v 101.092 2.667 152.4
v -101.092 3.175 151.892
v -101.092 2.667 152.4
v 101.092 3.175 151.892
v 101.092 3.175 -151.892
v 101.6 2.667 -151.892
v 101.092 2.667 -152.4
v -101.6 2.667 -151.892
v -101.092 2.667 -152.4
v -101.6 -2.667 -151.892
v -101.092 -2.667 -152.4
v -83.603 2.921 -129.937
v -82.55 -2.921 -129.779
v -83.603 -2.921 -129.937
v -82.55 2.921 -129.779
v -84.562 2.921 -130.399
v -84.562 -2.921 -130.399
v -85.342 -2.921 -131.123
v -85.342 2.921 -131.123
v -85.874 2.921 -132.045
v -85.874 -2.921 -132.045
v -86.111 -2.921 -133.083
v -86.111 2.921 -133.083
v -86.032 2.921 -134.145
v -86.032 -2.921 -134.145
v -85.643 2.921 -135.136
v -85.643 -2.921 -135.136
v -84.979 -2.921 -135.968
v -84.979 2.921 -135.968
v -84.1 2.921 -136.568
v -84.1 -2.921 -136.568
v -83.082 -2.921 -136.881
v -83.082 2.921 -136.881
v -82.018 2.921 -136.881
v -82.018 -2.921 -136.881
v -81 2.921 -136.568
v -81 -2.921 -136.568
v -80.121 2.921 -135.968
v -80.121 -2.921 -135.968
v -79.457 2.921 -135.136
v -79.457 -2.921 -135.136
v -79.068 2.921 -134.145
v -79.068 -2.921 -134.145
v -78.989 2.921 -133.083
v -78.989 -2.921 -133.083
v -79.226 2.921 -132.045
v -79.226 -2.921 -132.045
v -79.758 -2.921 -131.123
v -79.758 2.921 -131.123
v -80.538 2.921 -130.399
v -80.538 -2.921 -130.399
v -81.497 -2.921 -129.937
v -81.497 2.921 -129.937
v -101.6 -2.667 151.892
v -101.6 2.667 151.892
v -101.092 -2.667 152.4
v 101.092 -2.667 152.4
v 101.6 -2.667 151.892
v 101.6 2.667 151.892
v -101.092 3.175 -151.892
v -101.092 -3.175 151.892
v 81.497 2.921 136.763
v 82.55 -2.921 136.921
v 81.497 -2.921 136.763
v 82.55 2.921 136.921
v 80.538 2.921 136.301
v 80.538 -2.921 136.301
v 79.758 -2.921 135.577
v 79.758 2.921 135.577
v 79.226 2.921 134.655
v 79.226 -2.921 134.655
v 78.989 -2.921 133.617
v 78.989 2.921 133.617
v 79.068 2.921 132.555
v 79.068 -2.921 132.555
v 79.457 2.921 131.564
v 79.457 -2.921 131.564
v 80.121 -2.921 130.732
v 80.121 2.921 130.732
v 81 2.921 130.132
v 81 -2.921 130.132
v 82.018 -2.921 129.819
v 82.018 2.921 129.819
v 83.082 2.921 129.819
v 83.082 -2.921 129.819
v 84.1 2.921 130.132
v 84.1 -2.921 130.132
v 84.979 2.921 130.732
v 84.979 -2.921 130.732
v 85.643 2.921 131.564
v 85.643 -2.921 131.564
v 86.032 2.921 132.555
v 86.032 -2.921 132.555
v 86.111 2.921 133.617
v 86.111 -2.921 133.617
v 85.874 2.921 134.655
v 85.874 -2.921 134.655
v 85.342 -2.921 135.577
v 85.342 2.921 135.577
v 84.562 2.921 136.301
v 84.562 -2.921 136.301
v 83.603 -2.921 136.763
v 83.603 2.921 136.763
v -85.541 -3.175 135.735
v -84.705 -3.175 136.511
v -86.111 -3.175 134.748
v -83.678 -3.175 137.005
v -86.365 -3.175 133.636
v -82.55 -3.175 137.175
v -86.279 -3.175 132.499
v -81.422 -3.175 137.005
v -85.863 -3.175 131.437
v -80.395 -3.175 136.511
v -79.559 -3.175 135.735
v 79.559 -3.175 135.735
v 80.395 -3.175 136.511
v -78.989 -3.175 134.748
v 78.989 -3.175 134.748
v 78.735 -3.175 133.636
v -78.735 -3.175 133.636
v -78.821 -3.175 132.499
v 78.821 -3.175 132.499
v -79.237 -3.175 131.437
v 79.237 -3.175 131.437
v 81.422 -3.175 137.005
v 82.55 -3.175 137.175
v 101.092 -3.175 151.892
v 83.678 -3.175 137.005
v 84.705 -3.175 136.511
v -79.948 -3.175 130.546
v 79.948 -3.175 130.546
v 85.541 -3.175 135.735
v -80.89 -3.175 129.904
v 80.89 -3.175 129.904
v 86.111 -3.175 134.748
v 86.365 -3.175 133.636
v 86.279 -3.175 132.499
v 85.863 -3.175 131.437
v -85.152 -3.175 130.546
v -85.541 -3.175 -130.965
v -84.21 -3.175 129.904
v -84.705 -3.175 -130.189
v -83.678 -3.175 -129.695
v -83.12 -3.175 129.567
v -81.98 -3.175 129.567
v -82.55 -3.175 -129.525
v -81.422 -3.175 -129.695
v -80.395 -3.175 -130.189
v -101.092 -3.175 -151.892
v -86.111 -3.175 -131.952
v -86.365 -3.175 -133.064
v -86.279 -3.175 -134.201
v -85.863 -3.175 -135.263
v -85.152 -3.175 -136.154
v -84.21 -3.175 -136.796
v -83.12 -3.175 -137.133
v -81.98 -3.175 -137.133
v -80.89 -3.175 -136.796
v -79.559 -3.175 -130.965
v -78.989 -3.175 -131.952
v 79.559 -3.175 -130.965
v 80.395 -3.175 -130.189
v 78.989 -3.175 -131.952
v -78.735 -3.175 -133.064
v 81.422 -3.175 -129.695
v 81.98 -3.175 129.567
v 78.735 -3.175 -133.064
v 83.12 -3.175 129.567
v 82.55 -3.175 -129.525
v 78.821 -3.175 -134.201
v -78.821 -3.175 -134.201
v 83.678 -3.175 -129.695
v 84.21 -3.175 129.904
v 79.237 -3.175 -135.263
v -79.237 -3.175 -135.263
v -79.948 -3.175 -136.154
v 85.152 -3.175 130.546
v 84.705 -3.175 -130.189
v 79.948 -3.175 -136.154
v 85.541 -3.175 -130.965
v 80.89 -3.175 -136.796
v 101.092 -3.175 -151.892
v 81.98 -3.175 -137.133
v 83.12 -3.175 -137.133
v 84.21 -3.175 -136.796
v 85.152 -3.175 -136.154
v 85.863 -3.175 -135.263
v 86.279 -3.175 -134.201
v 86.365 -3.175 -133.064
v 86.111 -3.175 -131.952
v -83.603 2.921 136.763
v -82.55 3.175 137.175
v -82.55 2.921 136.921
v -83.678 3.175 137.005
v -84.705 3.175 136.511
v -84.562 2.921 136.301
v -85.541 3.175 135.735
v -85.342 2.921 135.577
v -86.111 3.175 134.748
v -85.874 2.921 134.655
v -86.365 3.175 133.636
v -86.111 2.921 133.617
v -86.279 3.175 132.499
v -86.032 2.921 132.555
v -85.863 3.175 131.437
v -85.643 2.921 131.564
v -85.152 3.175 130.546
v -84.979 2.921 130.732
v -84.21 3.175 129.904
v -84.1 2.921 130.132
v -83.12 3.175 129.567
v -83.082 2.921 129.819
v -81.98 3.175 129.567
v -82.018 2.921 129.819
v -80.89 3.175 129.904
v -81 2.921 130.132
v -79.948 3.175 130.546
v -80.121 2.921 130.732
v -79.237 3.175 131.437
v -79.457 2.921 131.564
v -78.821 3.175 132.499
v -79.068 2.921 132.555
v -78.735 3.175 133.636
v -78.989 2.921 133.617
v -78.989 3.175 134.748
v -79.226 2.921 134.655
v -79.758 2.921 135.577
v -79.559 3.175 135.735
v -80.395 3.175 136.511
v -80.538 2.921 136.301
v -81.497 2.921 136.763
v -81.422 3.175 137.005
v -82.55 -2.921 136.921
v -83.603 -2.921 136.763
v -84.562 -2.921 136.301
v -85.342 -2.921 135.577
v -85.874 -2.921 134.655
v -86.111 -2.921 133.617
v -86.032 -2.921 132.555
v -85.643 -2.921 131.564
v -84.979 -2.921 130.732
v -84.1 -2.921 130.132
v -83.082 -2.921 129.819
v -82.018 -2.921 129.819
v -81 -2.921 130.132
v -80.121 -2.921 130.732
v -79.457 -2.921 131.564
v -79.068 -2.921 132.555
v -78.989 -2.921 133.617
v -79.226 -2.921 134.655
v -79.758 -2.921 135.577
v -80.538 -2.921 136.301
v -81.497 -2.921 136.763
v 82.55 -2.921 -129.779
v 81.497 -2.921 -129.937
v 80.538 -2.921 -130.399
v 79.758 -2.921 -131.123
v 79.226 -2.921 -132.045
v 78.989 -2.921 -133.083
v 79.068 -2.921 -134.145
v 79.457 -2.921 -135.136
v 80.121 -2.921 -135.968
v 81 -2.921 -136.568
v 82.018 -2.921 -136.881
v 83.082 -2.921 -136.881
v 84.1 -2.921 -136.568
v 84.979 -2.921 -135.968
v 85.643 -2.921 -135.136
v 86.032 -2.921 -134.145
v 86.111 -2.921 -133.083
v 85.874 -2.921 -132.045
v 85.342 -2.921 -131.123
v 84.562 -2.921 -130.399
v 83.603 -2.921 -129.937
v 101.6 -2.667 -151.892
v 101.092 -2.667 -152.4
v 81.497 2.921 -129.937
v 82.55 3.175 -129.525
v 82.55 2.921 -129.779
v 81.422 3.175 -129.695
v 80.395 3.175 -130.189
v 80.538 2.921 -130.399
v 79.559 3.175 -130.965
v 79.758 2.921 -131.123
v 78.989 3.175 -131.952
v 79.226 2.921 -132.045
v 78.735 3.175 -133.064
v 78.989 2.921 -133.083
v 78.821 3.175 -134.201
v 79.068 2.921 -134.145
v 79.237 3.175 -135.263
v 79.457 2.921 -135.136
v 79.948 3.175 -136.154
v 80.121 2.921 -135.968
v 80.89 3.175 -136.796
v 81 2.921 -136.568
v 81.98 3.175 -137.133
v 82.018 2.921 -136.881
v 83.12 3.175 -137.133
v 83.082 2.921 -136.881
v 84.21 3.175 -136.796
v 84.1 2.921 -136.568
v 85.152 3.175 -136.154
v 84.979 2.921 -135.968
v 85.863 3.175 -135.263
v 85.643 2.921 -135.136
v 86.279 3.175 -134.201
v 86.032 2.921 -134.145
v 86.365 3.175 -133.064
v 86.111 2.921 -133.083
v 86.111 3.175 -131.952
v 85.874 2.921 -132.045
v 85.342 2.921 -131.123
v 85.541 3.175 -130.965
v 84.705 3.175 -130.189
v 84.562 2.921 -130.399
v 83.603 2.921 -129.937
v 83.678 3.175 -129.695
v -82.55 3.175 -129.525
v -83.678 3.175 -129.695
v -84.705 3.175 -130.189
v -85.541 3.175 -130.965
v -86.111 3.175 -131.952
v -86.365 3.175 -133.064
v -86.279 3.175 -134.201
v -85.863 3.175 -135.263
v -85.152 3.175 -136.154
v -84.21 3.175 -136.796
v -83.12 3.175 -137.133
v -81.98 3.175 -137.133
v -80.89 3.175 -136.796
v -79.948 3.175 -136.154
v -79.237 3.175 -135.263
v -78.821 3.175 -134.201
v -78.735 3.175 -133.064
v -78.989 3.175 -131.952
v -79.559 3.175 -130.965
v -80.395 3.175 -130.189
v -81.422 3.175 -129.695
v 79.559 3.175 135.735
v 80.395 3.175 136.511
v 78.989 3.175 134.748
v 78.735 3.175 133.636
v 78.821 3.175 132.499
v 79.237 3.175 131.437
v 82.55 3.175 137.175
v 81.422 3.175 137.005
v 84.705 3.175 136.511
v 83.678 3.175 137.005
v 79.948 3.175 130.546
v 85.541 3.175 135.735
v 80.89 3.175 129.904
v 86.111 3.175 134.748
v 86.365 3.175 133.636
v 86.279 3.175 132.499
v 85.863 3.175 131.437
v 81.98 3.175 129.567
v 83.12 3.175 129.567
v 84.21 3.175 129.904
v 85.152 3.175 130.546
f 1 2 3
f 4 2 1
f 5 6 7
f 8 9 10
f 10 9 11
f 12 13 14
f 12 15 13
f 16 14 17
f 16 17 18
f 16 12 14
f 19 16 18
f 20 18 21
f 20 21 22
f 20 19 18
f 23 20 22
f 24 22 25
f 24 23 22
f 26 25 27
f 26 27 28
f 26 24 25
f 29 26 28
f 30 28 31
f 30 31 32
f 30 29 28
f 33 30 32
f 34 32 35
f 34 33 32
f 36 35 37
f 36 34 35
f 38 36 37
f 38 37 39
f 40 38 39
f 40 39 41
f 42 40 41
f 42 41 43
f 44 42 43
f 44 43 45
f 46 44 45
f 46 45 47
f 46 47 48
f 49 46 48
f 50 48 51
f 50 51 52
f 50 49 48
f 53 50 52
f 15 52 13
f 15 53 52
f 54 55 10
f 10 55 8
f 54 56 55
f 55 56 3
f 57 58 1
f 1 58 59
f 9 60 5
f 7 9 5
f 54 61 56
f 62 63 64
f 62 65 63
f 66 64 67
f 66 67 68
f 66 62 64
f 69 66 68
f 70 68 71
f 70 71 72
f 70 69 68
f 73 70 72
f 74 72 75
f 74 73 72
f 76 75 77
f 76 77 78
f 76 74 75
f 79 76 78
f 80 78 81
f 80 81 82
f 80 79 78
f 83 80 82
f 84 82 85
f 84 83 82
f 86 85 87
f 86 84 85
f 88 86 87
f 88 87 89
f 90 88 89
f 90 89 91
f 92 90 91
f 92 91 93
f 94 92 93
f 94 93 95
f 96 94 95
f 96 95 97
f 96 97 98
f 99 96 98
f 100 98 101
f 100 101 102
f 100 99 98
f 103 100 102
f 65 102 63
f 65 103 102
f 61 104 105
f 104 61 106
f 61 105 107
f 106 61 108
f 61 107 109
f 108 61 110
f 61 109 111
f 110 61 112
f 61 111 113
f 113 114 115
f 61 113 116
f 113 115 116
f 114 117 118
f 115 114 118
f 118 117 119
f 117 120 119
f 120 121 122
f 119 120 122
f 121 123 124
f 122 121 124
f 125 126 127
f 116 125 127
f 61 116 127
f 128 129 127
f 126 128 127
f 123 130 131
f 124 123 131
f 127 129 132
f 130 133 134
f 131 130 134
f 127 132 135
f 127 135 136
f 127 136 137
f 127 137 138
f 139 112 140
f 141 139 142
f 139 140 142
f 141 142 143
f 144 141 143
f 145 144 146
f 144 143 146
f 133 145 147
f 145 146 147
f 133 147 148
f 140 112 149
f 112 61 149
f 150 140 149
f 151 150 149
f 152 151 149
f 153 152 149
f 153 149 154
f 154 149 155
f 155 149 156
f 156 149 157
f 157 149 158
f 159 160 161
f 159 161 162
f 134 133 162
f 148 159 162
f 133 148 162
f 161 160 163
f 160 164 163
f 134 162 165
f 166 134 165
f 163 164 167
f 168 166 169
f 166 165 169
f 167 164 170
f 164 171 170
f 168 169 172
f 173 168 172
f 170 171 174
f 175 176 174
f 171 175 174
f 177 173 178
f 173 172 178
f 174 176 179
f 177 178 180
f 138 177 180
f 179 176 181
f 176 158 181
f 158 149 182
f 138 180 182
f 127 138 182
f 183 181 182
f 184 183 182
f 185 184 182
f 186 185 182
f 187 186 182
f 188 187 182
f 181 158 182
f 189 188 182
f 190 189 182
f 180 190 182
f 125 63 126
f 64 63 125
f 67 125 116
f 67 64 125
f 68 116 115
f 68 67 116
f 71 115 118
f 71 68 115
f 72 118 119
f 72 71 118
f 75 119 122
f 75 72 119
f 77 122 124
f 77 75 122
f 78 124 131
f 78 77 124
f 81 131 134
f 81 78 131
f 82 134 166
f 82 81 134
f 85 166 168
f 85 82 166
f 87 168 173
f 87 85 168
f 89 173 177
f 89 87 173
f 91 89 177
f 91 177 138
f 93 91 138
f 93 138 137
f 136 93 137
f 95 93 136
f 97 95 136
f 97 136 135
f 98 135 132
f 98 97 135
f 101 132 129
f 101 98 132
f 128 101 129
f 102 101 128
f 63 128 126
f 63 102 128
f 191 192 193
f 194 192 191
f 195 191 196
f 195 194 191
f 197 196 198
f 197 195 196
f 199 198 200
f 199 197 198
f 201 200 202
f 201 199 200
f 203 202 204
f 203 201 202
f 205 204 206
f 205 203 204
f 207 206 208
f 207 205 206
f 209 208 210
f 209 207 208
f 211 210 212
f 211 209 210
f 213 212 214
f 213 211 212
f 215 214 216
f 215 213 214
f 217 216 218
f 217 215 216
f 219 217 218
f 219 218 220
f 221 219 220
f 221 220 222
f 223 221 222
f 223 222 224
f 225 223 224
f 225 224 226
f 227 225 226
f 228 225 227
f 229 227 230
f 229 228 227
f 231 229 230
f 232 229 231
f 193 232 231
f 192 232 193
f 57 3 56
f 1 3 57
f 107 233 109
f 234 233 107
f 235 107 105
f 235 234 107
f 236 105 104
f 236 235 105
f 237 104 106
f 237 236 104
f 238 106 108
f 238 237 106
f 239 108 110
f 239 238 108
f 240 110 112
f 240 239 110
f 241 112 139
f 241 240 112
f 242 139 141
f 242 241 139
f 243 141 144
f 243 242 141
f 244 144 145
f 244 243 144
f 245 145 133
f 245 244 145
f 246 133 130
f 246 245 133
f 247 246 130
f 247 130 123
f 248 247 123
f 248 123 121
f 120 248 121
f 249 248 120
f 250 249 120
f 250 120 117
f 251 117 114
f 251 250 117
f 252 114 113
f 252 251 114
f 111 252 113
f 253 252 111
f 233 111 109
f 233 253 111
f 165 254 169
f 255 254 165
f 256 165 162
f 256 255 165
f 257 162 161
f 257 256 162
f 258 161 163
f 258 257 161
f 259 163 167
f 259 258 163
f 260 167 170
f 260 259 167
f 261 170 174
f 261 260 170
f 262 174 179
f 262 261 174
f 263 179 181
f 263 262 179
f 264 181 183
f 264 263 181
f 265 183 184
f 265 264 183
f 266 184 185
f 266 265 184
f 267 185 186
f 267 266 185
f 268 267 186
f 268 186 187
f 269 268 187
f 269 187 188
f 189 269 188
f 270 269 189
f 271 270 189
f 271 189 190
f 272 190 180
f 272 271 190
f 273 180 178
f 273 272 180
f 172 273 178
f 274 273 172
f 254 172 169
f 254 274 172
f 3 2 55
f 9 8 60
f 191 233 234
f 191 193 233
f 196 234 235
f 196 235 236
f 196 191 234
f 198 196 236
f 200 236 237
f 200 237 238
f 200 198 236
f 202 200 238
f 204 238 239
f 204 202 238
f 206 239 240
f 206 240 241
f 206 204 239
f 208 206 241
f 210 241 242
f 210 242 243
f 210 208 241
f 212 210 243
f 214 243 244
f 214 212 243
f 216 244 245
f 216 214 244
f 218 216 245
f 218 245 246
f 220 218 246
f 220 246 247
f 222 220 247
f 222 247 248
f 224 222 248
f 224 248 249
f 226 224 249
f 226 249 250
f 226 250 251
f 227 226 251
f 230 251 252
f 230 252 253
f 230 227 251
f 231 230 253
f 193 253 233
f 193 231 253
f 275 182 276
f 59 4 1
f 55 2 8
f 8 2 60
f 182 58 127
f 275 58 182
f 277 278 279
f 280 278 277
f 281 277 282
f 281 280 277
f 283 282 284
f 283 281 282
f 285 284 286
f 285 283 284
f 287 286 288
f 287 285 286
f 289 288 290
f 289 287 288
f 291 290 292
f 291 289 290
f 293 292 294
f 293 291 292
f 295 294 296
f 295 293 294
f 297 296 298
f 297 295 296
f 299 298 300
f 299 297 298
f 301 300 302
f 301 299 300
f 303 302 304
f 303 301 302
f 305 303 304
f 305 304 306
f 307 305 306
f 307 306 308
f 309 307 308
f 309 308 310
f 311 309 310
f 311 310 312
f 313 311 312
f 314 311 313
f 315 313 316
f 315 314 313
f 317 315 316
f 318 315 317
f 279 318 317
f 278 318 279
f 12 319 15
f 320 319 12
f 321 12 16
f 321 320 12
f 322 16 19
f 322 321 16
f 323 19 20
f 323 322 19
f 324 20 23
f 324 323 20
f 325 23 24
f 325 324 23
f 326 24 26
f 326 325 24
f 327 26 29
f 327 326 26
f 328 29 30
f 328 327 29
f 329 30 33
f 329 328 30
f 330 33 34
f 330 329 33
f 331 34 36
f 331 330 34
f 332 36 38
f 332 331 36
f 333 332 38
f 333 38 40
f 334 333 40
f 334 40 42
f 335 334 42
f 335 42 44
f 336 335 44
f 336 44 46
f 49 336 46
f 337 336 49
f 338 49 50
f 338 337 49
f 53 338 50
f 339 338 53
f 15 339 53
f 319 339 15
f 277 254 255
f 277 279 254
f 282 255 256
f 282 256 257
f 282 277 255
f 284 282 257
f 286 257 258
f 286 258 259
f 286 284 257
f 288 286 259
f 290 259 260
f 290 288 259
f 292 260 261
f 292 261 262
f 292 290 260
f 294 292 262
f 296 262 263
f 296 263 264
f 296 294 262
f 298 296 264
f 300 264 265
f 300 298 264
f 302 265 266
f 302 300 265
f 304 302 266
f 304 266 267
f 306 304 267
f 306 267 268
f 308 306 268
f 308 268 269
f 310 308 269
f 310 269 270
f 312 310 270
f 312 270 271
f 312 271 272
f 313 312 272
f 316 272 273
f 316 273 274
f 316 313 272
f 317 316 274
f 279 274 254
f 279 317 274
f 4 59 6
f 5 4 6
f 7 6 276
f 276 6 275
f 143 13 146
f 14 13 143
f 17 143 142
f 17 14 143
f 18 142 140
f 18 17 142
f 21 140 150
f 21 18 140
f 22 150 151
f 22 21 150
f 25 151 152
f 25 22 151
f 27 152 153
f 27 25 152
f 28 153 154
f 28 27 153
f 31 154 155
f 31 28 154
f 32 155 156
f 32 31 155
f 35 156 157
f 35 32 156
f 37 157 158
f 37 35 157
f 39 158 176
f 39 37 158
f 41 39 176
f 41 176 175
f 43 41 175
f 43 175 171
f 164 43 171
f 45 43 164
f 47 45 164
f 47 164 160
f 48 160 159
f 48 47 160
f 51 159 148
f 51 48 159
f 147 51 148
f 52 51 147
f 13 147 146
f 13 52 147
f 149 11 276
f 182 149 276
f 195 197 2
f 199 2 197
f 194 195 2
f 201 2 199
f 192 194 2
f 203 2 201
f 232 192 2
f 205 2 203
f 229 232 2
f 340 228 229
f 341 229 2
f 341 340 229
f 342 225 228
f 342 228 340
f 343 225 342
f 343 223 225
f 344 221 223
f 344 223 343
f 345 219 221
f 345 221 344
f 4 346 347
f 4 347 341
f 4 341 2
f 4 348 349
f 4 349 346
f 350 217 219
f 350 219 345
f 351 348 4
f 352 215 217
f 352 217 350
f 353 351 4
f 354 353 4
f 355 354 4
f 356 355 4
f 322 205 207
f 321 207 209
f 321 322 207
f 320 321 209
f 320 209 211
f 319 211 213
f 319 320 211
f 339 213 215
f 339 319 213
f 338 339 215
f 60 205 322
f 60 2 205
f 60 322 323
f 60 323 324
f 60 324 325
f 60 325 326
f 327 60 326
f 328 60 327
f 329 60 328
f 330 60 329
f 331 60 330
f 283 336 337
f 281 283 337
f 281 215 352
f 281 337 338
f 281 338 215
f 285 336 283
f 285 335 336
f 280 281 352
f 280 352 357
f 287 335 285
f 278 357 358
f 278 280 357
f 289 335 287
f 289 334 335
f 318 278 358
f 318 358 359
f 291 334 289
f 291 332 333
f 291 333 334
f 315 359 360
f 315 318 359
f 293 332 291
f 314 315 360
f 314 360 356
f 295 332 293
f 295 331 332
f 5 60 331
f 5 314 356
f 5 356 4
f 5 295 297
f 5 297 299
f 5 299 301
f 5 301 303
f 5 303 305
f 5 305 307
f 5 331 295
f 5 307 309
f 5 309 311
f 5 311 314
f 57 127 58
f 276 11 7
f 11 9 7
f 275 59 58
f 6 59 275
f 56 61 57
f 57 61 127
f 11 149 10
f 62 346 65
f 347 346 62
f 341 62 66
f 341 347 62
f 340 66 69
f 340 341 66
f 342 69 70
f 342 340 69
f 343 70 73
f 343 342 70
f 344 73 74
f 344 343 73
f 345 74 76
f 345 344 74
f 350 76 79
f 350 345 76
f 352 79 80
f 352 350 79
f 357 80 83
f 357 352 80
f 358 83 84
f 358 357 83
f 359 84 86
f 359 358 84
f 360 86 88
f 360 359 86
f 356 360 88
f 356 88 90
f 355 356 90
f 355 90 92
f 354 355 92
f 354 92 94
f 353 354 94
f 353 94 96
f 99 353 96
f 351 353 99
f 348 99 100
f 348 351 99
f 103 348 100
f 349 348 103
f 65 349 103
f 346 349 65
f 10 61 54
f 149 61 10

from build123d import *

# Parameters (mm, degrees)
SKETCH1_W                        = 203.2
SKETCH1_H                        = 304.8
BOSS_EXTRUDE1_DEPTH              = 3.175
F_1_4_CLEARANCE_HOLE1_AT_2_COUNT = 2
F_1_4_CLEARANCE_HOLE1_AT_2_PITCH = 165.1
F_1_4_CLEARANCE_HOLE1_AT_3_COUNT = 2
F_1_4_CLEARANCE_HOLE1_AT_3_PITCH = 313.666861495
F_1_4_CLEARANCE_HOLE1_AT_4_COUNT = 2
F_1_4_CLEARANCE_HOLE1_AT_4_PITCH = 266.7
CHAMFER1_SIZE                    = 0.508


with BuildPart() as part:
    # Sketch1 → Boss-Extrude1 (new, symmetric)
    with BuildSketch(Plane(origin=(0, 0, 0), x_dir=(1, 0, 0), z_dir=(0, 1, 0))):
        Rectangle(SKETCH1_W, SKETCH1_H)
    extrude(amount=BOSS_EXTRUDE1_DEPTH, both=True)

    # Sketch4 → 1/4 Clearance Hole1 (revolve, cut)
    with BuildSketch(Plane(origin=(-82.55, 3.175, -133.35), x_dir=(0, 0, 1), z_dir=(1, 0, 0))):
        Polygon((0, 0), (0, 6.35), (3.82524, 6.35), (3.57124, 6.096), (3.57124, 0.254), (3.82524, 0), align=None)
    f_1_4_clearance_hole1 = revolve(axis=Axis((-82.55, 9.525, -133.35), (0, -1, 0)), mode=Mode.SUBTRACT)

    # 1/4 Clearance Hole1 at 2: 1/4 Clearance Hole1 ×2
    with Locations(*[(i * F_1_4_CLEARANCE_HOLE1_AT_2_PITCH, 0, 0) for i in range(1, F_1_4_CLEARANCE_HOLE1_AT_2_COUNT)]):
        add(f_1_4_clearance_hole1, mode=Mode.SUBTRACT)

    # 1/4 Clearance Hole1 at 3: 1/4 Clearance Hole1 ×2
    with Locations(*[Vector(0.5263546146162954, 0, 0.8502651466878619) * (i * F_1_4_CLEARANCE_HOLE1_AT_3_PITCH) for i in range(1, F_1_4_CLEARANCE_HOLE1_AT_3_COUNT)]):
        add(f_1_4_clearance_hole1, mode=Mode.SUBTRACT)

    # 1/4 Clearance Hole1 at 4: 1/4 Clearance Hole1 ×2
    with Locations(*[(0, 0, i * F_1_4_CLEARANCE_HOLE1_AT_4_PITCH) for i in range(1, F_1_4_CLEARANCE_HOLE1_AT_4_COUNT)]):
        add(f_1_4_clearance_hole1, mode=Mode.SUBTRACT)

    # Chamfer1
    chamfer1_edges = [part.edges().sort_by_distance(p)[0] for p in [
        (101.6, 3.175, 0),
        (101.6, -3.175, 0),
        (101.6, 0, -152.4),
        (0, 3.175, -152.4),
        (0, -3.175, -152.4),
        (-101.6, 0, -152.4),
        (-101.6, 3.175, 0),
        (-101.6, -3.175, 0),
        (-101.6, 0, 152.4),
        (0, 3.175, 152.4),
        (101.6, 0, 152.4),
        (0, -3.175, 152.4),
    ]]
    chamfer(chamfer1_edges, length=CHAMFER1_SIZE)


solid = part.part
